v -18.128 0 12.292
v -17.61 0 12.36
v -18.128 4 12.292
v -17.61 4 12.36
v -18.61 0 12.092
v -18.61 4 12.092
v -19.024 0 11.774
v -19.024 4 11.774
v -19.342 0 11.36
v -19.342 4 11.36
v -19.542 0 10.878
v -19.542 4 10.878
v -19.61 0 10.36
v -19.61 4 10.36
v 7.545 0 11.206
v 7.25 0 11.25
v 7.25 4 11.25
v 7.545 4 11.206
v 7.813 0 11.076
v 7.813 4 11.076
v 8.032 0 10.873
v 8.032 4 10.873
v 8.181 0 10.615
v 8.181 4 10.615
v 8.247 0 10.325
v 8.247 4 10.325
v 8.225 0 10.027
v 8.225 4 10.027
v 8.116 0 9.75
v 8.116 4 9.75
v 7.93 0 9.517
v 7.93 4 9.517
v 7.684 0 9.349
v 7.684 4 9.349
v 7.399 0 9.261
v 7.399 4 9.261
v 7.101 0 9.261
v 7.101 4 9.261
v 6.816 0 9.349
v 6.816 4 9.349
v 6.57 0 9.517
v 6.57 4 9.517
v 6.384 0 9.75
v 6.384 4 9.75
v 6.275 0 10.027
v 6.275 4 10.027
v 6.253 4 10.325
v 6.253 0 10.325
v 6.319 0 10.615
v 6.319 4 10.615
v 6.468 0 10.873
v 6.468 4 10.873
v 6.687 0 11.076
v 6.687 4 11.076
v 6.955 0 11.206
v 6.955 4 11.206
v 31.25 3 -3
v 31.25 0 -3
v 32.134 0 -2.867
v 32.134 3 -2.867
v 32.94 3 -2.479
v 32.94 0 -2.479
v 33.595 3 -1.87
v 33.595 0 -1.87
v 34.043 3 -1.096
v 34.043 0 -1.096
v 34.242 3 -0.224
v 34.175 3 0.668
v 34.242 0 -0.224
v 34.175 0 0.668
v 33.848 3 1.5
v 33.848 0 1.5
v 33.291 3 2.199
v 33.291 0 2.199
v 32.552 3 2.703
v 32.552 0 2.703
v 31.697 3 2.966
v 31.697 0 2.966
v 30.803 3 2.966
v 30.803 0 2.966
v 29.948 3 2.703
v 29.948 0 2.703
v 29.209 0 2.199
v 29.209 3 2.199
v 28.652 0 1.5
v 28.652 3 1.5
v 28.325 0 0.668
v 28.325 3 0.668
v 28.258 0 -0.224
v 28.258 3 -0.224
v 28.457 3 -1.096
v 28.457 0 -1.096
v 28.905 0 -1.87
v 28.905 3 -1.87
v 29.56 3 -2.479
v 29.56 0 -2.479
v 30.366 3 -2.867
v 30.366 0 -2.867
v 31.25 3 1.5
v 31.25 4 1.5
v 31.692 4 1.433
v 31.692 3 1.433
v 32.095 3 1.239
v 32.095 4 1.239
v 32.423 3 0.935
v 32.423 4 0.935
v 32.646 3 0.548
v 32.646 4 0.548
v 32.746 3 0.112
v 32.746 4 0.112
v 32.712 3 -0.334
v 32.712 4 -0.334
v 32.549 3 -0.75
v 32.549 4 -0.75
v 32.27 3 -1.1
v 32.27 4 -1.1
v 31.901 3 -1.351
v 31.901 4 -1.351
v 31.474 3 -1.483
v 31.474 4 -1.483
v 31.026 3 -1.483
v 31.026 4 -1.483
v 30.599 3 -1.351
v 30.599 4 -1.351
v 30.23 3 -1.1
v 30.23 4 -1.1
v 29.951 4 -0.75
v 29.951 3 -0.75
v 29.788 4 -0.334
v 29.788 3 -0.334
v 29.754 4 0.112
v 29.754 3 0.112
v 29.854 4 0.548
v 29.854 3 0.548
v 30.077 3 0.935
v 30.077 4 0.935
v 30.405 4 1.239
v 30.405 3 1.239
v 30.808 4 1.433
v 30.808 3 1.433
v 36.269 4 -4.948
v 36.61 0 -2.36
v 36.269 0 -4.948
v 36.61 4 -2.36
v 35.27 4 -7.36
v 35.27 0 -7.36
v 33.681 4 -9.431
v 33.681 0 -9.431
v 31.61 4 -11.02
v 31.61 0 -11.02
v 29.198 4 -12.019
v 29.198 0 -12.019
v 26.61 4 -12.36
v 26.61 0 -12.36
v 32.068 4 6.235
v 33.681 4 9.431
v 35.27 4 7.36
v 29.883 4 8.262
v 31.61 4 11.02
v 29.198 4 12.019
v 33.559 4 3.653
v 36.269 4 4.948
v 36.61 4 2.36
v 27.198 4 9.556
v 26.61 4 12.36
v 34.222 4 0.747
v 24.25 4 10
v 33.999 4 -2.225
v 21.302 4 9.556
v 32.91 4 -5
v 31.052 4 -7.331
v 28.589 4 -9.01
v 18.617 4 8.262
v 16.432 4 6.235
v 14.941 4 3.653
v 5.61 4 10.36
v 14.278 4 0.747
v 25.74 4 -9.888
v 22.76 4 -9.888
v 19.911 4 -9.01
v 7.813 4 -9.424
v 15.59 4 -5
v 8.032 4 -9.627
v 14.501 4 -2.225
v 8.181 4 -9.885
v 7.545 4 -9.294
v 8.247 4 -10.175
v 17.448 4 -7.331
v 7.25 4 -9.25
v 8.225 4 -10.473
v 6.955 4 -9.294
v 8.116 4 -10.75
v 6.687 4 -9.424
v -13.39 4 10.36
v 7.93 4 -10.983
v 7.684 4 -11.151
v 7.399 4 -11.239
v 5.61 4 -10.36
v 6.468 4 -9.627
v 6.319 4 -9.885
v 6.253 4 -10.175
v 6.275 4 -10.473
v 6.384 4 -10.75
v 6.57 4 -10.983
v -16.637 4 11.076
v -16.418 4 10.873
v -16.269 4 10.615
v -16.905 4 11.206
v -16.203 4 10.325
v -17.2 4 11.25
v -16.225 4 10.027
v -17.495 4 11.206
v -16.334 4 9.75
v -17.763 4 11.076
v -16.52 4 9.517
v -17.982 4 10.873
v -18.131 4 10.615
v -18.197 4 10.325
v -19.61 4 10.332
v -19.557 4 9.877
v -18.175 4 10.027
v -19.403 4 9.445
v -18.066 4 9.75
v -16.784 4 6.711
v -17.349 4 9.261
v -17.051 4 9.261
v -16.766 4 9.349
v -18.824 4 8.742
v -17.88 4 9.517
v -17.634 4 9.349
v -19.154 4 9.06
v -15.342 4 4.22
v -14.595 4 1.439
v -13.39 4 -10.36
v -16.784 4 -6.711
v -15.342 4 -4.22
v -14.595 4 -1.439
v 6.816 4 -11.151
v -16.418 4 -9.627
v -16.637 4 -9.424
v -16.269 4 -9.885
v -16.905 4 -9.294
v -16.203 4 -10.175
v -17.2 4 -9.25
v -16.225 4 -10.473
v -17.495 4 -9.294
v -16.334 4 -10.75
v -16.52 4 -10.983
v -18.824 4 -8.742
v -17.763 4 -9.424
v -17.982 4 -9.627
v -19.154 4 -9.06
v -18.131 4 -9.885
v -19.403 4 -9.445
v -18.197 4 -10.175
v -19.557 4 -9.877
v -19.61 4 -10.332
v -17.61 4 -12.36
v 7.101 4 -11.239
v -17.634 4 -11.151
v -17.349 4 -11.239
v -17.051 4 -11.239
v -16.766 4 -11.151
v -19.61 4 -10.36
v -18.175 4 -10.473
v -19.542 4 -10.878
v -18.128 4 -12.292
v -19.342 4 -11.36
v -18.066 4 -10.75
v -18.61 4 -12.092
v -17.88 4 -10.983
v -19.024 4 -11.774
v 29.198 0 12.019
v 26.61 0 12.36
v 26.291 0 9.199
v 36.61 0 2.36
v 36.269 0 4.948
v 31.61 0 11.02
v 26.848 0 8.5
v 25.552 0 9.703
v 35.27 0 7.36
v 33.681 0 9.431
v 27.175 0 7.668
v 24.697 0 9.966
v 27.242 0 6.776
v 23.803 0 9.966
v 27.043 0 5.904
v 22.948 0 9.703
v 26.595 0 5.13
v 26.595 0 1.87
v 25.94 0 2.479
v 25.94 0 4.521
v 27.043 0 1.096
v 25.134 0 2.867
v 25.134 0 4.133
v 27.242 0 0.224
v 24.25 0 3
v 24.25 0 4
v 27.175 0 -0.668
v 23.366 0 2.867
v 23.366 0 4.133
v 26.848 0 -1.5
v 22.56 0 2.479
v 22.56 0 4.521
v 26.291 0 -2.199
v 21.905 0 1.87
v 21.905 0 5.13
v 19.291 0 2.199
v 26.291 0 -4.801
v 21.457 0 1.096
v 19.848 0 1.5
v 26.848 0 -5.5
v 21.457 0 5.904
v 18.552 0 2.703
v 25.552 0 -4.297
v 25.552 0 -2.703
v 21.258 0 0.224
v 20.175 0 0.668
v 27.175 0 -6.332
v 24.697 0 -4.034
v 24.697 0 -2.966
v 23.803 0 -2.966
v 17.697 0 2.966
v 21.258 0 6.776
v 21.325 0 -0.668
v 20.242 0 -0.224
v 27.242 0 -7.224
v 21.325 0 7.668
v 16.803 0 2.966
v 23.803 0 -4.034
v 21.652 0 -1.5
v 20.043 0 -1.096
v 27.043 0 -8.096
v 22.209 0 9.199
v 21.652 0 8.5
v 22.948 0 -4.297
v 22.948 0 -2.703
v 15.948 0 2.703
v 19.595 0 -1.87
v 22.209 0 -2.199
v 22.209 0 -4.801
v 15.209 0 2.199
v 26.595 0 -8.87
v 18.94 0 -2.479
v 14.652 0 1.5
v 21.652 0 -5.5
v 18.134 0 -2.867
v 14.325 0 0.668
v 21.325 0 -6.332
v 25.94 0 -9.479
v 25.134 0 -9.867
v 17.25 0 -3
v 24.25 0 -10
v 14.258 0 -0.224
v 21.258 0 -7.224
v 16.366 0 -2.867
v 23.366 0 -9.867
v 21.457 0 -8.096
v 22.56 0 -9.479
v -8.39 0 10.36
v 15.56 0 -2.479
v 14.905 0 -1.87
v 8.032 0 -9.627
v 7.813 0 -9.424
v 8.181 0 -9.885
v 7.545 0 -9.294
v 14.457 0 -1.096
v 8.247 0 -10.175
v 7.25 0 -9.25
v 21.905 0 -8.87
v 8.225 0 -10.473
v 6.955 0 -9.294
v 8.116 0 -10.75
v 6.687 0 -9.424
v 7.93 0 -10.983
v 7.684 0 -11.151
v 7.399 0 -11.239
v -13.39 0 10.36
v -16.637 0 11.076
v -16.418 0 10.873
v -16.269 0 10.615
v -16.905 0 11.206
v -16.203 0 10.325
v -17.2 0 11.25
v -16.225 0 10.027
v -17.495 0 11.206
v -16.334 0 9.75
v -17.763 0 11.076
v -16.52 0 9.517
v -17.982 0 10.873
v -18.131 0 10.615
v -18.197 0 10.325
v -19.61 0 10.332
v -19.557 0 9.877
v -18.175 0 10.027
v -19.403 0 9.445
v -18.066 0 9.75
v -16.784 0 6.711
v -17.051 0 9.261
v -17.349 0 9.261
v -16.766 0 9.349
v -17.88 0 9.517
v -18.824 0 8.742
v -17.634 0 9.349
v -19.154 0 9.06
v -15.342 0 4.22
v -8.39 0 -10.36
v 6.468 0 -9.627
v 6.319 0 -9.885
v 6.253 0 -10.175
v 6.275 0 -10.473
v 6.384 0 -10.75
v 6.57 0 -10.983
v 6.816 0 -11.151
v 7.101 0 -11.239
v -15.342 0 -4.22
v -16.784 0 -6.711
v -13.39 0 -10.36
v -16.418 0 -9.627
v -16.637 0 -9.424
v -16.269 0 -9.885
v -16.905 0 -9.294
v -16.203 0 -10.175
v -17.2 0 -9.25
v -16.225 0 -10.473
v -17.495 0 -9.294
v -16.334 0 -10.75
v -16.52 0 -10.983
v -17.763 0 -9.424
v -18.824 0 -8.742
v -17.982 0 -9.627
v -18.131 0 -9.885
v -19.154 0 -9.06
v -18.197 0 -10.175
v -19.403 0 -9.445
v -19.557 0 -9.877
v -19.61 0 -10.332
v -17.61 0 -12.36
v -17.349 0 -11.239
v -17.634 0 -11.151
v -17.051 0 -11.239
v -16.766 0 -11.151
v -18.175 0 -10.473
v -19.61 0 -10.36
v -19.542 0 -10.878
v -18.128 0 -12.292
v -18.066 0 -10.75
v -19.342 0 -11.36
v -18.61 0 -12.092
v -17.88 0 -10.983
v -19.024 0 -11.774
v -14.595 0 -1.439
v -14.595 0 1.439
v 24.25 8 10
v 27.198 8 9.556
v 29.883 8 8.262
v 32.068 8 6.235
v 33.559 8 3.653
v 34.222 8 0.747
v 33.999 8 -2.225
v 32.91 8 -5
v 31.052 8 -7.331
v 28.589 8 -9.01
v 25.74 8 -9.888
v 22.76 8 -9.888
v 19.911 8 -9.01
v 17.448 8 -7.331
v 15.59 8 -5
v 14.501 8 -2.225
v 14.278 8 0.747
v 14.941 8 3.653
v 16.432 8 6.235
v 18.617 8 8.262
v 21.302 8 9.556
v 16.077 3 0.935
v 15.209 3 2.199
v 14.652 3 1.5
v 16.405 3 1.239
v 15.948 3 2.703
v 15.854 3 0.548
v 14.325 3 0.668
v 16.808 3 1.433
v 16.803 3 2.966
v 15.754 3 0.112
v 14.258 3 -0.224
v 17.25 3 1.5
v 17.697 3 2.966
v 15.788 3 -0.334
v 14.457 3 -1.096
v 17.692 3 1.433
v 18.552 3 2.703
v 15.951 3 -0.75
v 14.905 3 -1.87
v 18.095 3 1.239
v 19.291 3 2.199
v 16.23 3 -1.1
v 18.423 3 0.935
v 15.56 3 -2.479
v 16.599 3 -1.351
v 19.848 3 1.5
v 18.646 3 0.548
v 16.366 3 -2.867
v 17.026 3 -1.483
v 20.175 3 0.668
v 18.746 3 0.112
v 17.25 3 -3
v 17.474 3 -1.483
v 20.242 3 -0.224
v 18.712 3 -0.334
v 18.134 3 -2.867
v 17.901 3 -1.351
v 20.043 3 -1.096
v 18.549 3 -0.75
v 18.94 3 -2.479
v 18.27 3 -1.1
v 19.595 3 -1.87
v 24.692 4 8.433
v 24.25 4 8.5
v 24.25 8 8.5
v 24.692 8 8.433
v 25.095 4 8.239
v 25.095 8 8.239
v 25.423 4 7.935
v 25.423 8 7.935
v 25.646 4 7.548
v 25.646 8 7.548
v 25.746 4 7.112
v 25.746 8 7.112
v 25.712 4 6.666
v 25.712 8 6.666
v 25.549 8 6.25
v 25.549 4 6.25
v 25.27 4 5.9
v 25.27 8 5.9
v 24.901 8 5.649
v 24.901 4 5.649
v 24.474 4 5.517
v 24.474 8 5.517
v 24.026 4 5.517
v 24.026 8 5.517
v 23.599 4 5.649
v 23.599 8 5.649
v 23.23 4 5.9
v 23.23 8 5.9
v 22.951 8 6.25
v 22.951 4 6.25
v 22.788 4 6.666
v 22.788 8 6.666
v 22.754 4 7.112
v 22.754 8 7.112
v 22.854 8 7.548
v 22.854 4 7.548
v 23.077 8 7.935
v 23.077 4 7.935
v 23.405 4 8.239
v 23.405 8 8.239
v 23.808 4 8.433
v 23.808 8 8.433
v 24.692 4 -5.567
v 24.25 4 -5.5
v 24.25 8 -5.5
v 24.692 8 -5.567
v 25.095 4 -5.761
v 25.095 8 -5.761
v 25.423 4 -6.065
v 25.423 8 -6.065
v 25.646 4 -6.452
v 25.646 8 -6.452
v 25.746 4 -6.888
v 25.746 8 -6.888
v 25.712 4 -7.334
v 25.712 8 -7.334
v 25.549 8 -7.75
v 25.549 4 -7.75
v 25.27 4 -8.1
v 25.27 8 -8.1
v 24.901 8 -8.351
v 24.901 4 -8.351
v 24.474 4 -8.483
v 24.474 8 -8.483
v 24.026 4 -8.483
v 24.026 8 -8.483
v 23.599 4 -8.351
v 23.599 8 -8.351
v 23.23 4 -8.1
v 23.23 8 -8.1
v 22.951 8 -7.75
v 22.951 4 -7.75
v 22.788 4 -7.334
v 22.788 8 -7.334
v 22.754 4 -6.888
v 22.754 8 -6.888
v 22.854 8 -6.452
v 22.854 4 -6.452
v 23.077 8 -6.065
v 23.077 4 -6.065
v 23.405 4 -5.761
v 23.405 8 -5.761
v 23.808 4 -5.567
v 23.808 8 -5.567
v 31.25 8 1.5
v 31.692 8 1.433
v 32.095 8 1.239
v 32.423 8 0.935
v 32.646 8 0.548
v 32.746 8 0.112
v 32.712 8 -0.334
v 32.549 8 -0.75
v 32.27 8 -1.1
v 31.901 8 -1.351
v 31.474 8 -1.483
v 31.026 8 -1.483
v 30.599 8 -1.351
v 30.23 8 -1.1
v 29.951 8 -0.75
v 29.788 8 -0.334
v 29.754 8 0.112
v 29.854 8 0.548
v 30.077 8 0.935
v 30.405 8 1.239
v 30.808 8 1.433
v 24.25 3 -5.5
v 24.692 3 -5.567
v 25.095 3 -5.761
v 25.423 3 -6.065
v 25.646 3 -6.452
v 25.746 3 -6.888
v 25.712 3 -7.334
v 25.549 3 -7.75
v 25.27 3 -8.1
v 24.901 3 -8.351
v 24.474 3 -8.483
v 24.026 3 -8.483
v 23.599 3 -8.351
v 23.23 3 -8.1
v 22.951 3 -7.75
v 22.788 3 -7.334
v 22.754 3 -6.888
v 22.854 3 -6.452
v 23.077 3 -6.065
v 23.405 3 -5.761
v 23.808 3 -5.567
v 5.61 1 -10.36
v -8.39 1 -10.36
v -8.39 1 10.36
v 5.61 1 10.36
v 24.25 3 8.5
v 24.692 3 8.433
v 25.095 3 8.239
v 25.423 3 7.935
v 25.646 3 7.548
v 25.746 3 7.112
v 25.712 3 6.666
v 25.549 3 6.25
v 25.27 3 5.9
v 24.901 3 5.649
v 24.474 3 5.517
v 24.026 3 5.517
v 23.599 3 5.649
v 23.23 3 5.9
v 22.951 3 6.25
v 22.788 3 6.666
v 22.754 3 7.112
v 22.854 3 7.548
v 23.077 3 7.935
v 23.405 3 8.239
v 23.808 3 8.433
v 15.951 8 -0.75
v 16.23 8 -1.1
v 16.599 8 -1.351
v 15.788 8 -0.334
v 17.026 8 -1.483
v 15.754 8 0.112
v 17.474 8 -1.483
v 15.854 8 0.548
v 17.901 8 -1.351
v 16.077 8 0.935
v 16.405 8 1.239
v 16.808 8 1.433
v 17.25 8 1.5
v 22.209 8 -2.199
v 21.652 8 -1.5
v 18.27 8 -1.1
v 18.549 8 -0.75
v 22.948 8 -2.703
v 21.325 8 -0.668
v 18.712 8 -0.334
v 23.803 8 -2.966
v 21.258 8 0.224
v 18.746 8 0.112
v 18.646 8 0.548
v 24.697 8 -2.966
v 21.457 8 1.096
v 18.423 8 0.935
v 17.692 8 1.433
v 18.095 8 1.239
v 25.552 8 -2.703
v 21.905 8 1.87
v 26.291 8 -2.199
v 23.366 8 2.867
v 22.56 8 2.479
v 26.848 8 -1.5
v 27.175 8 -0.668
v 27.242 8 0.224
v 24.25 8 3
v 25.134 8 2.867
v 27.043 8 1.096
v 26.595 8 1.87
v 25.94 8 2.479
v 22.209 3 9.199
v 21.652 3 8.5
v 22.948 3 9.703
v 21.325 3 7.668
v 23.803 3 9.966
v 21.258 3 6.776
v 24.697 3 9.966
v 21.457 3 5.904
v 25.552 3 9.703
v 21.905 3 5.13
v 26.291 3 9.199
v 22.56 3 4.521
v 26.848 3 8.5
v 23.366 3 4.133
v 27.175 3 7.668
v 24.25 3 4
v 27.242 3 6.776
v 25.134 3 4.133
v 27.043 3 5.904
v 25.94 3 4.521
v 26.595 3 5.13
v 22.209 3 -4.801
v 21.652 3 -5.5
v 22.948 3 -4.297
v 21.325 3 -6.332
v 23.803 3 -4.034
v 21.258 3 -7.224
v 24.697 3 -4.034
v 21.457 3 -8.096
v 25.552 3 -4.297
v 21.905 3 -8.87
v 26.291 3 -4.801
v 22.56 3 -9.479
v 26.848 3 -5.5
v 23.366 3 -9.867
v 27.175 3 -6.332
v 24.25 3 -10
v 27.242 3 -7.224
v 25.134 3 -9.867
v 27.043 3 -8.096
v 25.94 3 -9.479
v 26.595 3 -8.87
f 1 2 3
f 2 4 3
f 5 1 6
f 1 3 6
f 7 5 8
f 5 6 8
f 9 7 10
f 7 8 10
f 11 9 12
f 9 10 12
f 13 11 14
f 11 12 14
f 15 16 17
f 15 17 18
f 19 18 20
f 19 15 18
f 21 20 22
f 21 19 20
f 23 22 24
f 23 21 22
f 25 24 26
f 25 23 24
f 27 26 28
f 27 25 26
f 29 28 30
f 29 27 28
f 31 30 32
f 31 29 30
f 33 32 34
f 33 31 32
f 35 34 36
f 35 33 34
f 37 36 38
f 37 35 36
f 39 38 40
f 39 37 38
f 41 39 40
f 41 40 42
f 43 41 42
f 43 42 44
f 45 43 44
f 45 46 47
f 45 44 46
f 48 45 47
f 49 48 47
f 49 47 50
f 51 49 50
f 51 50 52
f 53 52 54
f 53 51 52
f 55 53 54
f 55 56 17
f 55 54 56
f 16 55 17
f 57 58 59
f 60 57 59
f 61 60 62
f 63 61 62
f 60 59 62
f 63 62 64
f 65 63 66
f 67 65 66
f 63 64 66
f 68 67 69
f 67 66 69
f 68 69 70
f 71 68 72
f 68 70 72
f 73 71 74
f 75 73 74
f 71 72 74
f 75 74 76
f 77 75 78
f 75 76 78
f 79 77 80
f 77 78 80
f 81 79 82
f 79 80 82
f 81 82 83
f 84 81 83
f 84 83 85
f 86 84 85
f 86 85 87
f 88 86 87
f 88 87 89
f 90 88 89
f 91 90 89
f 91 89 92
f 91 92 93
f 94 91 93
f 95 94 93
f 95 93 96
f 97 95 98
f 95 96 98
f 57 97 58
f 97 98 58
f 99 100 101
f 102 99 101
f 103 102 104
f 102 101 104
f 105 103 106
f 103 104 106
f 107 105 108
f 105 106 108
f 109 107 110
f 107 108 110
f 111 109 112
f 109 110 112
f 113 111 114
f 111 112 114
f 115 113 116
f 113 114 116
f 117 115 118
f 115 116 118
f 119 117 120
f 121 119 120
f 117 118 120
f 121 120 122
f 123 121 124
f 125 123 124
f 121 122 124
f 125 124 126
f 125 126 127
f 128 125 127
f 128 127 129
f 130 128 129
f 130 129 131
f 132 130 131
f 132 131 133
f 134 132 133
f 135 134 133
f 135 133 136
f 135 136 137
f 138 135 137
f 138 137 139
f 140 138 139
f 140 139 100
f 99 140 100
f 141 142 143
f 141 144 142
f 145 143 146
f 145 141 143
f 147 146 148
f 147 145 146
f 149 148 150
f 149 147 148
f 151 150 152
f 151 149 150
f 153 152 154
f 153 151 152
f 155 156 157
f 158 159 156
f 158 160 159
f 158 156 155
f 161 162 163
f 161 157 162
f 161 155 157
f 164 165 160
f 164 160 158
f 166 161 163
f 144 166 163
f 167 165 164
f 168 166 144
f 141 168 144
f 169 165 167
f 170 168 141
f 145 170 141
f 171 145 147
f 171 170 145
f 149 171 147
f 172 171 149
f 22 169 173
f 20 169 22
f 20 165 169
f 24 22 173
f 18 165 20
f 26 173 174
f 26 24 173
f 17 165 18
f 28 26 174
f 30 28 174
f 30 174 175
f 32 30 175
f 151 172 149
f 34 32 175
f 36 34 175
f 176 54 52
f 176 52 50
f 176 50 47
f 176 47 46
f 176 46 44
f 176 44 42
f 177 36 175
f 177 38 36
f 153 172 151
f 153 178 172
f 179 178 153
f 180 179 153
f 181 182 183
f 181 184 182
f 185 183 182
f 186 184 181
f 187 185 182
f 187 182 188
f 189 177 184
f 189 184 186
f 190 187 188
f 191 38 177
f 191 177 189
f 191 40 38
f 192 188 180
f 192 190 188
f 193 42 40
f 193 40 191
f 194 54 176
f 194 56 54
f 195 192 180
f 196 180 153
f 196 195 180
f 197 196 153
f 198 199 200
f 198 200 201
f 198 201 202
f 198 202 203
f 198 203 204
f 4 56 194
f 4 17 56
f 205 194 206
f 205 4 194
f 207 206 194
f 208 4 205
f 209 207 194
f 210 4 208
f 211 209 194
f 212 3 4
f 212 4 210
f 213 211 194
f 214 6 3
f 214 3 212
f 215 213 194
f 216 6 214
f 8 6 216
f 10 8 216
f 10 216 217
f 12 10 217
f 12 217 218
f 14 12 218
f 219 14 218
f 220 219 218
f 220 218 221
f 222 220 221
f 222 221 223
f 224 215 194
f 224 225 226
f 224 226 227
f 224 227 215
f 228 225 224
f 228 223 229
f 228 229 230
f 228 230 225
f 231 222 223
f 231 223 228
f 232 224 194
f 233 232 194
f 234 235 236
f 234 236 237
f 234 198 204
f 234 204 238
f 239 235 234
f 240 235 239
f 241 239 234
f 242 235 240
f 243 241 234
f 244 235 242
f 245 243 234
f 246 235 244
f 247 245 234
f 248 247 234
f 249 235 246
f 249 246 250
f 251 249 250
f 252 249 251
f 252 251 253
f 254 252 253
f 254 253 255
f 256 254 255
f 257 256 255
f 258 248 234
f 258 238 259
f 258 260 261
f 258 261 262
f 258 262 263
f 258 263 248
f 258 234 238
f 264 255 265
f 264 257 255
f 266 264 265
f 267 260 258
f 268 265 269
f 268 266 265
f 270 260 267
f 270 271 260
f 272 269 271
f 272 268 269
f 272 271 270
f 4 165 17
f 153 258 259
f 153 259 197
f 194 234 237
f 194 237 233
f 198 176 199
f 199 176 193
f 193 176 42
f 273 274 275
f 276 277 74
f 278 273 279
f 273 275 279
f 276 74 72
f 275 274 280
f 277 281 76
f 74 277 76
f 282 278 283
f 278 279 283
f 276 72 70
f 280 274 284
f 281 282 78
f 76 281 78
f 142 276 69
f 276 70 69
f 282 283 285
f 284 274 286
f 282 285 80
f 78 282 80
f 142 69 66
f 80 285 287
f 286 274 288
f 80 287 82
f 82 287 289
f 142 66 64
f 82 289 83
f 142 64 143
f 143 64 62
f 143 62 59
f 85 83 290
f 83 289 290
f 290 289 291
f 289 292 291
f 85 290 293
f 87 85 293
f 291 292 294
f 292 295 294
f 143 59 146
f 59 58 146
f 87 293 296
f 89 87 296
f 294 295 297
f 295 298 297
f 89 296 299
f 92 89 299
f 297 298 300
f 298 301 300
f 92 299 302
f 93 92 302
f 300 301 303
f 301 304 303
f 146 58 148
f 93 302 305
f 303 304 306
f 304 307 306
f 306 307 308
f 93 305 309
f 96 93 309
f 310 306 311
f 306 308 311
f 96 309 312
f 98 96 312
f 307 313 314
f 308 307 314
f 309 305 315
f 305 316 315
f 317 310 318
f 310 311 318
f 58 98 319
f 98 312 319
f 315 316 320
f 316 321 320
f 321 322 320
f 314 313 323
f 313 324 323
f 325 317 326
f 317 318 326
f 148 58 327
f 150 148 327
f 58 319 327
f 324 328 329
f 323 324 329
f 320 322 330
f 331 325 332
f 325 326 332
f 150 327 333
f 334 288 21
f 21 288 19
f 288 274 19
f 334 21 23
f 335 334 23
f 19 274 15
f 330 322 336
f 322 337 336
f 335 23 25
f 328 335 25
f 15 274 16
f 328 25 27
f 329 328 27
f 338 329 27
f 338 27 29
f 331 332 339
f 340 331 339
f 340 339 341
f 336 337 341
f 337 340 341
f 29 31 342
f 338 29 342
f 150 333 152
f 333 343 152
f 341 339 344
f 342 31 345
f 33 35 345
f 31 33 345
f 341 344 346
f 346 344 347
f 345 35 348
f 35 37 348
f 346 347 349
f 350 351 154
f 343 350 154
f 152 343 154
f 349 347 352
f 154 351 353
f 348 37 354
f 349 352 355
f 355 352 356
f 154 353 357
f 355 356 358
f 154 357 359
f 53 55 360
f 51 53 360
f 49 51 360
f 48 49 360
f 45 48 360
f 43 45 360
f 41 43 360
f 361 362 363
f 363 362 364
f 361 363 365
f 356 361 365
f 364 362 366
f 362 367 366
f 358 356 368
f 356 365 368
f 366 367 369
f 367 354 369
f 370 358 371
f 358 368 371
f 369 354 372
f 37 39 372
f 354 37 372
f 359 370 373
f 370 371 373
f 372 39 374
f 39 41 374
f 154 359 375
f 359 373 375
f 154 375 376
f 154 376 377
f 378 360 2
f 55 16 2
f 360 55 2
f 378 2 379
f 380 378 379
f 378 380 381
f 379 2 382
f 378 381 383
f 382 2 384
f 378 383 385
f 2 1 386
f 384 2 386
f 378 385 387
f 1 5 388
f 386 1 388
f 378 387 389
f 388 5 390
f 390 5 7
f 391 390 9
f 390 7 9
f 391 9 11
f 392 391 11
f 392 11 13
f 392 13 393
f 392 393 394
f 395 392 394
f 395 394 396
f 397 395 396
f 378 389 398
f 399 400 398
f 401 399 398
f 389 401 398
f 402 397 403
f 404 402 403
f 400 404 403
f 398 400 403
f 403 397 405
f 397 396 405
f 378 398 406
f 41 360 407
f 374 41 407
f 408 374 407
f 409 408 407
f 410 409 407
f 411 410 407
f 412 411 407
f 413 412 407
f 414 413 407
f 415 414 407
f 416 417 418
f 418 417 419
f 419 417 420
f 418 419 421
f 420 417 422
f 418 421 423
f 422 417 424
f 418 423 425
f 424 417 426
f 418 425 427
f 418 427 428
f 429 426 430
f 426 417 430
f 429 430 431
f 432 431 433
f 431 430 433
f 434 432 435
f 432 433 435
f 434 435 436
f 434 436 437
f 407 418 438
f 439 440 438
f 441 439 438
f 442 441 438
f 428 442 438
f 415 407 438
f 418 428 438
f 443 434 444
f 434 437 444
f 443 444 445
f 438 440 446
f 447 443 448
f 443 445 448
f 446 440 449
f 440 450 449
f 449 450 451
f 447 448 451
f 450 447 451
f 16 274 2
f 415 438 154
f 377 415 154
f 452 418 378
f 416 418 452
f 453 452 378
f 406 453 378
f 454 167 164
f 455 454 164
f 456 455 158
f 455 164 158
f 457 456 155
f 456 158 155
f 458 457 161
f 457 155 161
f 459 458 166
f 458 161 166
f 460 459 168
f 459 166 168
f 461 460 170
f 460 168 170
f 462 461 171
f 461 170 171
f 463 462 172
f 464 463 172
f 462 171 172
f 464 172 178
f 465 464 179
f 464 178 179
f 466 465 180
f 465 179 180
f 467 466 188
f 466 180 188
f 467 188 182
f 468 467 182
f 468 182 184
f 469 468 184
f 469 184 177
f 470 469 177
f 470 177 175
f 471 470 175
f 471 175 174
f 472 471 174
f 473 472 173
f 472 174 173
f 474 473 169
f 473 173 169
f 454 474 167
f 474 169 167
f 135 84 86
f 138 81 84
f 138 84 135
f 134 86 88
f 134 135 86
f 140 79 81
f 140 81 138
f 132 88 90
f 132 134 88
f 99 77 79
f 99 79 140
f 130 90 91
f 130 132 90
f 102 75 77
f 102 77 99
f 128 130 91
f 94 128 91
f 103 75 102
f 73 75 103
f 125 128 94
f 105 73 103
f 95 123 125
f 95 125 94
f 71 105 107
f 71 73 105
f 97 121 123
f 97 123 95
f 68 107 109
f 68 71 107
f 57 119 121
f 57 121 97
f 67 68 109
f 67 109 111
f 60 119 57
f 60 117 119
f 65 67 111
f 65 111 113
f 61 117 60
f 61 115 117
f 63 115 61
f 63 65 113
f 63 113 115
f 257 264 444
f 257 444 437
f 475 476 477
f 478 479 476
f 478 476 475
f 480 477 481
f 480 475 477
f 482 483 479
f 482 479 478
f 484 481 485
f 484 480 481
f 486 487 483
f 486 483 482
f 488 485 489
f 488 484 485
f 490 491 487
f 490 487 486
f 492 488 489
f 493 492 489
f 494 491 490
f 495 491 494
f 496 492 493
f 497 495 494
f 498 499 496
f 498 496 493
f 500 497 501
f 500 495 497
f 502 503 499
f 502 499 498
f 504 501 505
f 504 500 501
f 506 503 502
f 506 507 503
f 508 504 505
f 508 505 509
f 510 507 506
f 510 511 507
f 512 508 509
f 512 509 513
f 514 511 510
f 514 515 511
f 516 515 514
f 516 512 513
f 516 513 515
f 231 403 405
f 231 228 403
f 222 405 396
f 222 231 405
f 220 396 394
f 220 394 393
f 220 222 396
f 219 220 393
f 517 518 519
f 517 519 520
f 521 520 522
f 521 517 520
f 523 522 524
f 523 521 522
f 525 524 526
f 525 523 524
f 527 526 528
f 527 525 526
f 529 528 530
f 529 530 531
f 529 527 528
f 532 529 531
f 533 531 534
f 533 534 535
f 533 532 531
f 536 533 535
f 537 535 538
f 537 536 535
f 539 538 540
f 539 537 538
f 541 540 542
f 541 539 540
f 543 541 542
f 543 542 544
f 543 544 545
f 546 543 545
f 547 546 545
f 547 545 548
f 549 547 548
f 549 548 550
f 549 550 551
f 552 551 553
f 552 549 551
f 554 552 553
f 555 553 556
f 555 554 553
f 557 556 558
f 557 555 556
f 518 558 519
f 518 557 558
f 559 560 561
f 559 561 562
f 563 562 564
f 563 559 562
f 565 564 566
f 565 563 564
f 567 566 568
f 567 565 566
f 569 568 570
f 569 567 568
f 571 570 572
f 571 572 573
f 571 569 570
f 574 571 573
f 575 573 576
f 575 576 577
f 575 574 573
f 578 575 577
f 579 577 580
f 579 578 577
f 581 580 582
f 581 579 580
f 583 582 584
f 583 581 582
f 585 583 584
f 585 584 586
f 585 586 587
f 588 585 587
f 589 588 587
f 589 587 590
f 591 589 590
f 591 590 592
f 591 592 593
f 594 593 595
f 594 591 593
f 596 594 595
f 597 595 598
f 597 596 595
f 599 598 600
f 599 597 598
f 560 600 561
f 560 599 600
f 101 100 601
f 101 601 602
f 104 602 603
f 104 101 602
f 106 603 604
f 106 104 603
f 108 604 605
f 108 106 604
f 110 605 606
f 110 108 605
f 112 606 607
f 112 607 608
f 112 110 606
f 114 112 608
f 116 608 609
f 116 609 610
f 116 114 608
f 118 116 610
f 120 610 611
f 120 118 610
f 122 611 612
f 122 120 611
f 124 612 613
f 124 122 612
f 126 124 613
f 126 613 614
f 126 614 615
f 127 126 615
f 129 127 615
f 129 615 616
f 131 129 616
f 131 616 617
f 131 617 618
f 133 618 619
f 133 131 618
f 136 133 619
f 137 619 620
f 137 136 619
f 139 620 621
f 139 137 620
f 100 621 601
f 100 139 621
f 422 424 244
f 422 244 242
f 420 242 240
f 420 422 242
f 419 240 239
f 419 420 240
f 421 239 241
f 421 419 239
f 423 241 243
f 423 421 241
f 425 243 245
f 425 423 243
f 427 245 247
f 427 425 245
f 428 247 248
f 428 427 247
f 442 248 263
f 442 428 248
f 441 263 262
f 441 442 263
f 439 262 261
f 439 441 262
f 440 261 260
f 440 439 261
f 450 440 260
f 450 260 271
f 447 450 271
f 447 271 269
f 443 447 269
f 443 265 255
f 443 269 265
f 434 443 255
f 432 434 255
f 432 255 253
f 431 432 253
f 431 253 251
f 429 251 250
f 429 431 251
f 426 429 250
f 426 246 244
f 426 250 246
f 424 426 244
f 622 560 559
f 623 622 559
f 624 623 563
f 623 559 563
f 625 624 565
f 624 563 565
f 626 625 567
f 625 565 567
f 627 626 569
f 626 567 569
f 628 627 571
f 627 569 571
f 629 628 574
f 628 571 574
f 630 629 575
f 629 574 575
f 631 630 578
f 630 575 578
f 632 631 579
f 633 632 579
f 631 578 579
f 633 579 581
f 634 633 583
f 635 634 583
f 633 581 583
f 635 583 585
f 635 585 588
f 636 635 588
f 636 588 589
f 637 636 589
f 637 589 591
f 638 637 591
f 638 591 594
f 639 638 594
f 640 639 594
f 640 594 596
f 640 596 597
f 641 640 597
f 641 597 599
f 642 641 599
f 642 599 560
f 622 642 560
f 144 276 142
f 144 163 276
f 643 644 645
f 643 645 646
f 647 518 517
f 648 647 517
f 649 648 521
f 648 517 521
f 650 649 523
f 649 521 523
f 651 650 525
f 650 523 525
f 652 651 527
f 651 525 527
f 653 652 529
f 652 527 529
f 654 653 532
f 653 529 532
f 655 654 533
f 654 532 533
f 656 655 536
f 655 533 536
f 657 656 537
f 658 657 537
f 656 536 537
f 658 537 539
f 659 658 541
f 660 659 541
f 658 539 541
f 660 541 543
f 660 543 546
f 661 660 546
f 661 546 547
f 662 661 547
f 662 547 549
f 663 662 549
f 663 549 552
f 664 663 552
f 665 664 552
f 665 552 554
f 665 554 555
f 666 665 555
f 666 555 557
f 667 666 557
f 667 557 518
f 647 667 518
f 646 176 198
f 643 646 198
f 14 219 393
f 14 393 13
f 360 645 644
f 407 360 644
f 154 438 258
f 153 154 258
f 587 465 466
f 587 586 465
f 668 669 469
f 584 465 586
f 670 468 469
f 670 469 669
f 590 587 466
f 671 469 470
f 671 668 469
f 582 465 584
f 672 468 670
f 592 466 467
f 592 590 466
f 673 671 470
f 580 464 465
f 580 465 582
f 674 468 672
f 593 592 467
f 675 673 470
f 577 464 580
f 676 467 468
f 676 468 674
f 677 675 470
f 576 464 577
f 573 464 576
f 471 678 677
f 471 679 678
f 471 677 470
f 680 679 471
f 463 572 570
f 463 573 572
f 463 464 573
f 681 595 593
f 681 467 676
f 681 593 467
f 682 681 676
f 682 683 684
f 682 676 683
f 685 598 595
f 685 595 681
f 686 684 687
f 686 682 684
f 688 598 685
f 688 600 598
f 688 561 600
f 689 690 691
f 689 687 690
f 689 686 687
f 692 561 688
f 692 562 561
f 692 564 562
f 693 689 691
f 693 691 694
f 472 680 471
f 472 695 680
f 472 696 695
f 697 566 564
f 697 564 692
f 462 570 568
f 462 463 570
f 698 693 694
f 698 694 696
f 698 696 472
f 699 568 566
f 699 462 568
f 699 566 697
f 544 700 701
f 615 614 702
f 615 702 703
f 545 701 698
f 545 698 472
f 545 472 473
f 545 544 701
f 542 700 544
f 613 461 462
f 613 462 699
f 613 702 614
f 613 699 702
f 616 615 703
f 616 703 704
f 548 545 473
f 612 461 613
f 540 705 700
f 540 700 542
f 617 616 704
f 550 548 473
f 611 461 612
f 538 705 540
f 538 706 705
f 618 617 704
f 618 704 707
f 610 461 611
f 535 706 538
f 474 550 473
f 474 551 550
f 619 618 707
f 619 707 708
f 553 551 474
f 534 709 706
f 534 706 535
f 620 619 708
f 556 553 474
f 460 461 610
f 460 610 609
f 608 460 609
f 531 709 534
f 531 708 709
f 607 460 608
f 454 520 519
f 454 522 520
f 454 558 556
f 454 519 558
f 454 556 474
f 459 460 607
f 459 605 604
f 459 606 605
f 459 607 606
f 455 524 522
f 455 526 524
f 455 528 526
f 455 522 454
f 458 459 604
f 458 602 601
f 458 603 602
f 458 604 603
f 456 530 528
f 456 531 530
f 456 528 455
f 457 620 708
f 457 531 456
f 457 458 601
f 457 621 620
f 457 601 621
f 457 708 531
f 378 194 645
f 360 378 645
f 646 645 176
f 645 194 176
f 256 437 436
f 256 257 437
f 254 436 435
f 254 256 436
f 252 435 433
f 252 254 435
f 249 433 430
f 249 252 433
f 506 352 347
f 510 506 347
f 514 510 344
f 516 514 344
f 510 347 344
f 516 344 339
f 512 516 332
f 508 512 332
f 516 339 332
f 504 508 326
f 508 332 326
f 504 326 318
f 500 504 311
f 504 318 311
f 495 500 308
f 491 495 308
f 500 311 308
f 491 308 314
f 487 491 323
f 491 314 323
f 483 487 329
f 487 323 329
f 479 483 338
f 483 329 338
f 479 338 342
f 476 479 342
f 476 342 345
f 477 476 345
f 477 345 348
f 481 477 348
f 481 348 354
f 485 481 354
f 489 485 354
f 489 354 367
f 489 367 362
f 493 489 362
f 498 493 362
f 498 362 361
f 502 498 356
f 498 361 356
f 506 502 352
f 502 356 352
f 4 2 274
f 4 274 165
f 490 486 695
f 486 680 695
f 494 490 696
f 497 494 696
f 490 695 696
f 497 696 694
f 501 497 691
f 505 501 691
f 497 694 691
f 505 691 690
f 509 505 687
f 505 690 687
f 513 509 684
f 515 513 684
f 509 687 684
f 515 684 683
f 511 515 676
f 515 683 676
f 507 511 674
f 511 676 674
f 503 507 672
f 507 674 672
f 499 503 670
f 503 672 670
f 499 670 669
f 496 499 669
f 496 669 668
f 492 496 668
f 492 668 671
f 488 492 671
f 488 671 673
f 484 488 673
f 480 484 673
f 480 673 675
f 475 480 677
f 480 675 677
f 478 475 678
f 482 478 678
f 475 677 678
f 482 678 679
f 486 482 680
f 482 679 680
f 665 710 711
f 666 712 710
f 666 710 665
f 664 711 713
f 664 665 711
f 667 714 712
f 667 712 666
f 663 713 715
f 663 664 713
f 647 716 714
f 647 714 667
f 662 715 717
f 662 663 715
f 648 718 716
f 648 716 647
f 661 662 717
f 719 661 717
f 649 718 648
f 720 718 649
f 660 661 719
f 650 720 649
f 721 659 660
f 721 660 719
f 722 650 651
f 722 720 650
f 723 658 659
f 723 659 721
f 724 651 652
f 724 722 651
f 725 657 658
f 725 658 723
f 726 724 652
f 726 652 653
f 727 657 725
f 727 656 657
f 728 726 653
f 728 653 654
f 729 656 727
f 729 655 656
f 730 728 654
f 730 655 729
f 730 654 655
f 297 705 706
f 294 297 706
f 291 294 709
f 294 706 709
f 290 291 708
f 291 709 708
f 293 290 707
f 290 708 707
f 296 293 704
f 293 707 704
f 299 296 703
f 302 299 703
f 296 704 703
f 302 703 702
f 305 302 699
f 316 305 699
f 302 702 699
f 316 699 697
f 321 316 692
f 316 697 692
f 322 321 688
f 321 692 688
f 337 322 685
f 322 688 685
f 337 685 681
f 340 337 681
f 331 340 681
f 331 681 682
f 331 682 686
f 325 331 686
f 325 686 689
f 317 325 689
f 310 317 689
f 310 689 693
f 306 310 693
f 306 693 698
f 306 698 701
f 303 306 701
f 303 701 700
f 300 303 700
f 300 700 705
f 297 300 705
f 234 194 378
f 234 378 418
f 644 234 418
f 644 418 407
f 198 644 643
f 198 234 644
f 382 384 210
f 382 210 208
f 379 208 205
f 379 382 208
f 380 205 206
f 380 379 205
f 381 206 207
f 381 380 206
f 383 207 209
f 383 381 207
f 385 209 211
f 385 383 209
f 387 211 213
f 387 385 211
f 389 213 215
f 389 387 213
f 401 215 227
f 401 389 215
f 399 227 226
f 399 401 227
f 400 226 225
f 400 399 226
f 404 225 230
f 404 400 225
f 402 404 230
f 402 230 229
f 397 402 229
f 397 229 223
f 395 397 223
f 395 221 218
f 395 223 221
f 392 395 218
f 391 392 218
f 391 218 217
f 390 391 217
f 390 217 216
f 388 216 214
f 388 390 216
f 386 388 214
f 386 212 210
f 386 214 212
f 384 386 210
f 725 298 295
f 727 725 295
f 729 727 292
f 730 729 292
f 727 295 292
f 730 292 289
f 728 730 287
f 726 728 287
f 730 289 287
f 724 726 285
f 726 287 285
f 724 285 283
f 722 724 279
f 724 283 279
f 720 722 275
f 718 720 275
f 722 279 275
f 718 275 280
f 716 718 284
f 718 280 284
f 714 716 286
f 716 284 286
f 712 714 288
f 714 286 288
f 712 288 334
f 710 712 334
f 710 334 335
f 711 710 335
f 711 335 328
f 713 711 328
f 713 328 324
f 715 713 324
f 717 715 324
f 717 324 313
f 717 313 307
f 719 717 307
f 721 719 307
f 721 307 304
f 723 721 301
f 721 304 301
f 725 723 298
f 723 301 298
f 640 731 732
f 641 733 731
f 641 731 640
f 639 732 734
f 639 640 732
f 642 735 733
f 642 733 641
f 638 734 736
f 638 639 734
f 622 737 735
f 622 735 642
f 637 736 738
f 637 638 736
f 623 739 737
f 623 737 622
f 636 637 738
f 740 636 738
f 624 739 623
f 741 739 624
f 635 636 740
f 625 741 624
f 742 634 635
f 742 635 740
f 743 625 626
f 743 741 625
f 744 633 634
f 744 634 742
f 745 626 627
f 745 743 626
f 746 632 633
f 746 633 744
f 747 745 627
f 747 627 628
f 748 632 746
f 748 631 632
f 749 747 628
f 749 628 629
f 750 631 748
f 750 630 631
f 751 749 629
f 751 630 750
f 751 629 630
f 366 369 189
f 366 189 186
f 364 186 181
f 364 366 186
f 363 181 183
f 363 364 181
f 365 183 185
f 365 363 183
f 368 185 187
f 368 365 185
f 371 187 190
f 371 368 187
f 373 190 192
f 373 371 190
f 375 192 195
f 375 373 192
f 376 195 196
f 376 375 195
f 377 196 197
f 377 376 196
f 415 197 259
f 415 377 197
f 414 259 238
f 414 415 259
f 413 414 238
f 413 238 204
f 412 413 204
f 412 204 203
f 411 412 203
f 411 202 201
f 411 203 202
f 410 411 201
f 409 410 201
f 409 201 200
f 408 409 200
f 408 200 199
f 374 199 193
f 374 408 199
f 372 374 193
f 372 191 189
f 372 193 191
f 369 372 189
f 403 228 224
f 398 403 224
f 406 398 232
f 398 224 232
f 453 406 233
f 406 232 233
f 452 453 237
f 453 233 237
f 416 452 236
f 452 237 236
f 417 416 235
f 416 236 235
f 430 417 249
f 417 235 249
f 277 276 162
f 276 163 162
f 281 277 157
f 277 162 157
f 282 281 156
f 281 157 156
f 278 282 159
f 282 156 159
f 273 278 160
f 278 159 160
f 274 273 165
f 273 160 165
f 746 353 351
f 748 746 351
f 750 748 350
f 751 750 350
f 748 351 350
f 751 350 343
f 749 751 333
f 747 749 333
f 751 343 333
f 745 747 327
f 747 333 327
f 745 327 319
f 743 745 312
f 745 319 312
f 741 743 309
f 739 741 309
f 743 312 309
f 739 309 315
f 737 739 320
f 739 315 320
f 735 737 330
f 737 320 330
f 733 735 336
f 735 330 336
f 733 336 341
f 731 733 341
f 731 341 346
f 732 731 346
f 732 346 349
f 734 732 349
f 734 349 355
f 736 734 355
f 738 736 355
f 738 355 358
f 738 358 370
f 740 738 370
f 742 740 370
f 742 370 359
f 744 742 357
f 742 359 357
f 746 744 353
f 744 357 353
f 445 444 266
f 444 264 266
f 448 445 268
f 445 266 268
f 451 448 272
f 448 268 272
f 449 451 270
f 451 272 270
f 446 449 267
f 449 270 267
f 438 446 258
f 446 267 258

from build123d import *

# Parameters (mm, degrees)
EXTRUDE_1_DEPTH          = 4
CUT_EXTRUDE_1_DEPTH      = 38.905694823
CUT_EXTRUDE_1_DEPTH_BACK = 38.905694823
SKETCH_2_R               = 1
SKETCH_3_W               = 14
SKETCH_3_H               = 20.72
CUT_EXTRUDE_3_DEPTH      = 3
SKETCH_5_W               = 5
SKETCH_5_H               = 20.72
CUT_EXTRUDE_4_DEPTH      = 4
SKETCH_13_W              = 24.72
SKETCH_13_H              = 4
EXTRUDE_5_DEPTH          = 27
SKETCH_15_R              = 10
EXTRUDE_6_DEPTH          = 4
SKETCH_14_R              = 1.5
CUT_EXTRUDE_7_DEPTH      = 4
FILLET_1_R               = 10
FILLET_2_R               = 10
SKETCH_6_R               = 11
CUT_EXTRUDE_9_DEPTH      = 4
SKETCH_17_W              = 24.72
SKETCH_17_H              = 4
CUT_EXTRUDE_10_DEPTH     = 16
FILLET_3_R               = 2
FILLET_4_R               = 2
FILLET_5_R               = 2
FILLET_6_R               = 2
SKETCH_18_R              = 3
CUT_EXTRUDE_11_DEPTH     = 13
SKETCH_20_R              = 3
CUT_EXTRUDE_12_DEPTH     = 3


with BuildPart() as part:
    # 草图1 → 凸台-拉伸1 (new body)
    with BuildSketch(Plane(origin=(0, 0, 0), x_dir=(1, 0, 0), z_dir=(0, 1, 0))):
        with BuildLine():
            Line((6.61, -12.36), (9.61, -12.36))
            Line((9.61, -12.36), (9.61, -9.36))
            Line((9.61, -9.36), (9.61, 9.36))
            Line((9.61, 9.36), (9.61, 12.36))
            Line((9.61, 12.36), (6.61, 12.36))
            Line((6.61, 12.36), (-32.61, 12.36))
            ThreePointArc((-32.61, 12.36), (-34.731320344, 11.481320344), (-35.61, 9.36))
            Line((-35.61, 9.36), (-35.61, -9.36))
            ThreePointArc((-35.61, -9.36), (-34.731320344, -11.481320344), (-32.61, -12.36))
            Line((-32.61, -12.36), (6.61, -12.36))
        make_face()
    extrude(amount=EXTRUDE_1_DEPTH)

    # 草图2 → 切除-拉伸1 (cut, two sides: drawn at the far end of the back side and taken through both)
    with BuildSketch(Plane(origin=(0, 0, 0), x_dir=(1, 0, 0), z_dir=(0, 1, 0)).offset(-CUT_EXTRUDE_1_DEPTH_BACK)):
        with Locations(Location((7.25, -10.25, 0), (0, 0, 270))):
            Circle(SKETCH_2_R)
        with Locations(Location((7.25, 10.25, 0), (0, 0, 270))):
            Circle(SKETCH_2_R)
        with Locations(Location((-17.2, -10.25, 0), (0, 0, 270))):
            Circle(SKETCH_2_R)
        with Locations(Location((-17.2, 10.25, 0), (0, 0, 270))):
            Circle(SKETCH_2_R)
    extrude(amount=CUT_EXTRUDE_1_DEPTH + CUT_EXTRUDE_1_DEPTH_BACK, mode=Mode.SUBTRACT)

    # 草图3 → 切除-拉伸3 (cut)
    with BuildSketch(Plane(origin=(0, 4, 0), x_dir=(1, 0, 0), z_dir=(0, 1, 0))):
        with Locations((-1.39, 0)):
            Rectangle(SKETCH_3_W, SKETCH_3_H)
    extrude(amount=-CUT_EXTRUDE_3_DEPTH, mode=Mode.SUBTRACT)

    # 草图5 → 切除-拉伸4 (cut)
    with BuildSketch(Plane(origin=(0, 4, 0), x_dir=(1, 0, 0), z_dir=(0, 1, 0))):
        with Locations((-10.89, 0)):
            Rectangle(SKETCH_5_W, SKETCH_5_H)
    extrude(amount=-CUT_EXTRUDE_4_DEPTH, mode=Mode.SUBTRACT)

    # 草图13 → 凸台-拉伸5 (add)
    with BuildSketch(Plane(origin=(9.61, 0, 0), x_dir=(0, 0, -1), z_dir=(1, 0, 0))):
        with Locations((0, 2)):
            Rectangle(SKETCH_13_W, SKETCH_13_H)
    extrude(amount=EXTRUDE_5_DEPTH)

    # 草图15 → 凸台-拉伸6 (add)
    with BuildSketch(Plane(origin=(0, 4, 0), x_dir=(1, 0, 0), z_dir=(0, 1, 0))):
        with Locations(Location((24.25, 0, 0), (0, 0, 270))):
            Circle(SKETCH_15_R)
    extrude(amount=EXTRUDE_6_DEPTH)

    # 草图14 → 切除-拉伸7 (cut, symmetric)
    with BuildSketch(Plane(origin=(0, 4, 0), x_dir=(1, 0, 0), z_dir=(0, 1, 0))):
        with Locations(Location((24.25, -7, 0), (0, 0, 270))):
            Circle(SKETCH_14_R)
        with Locations(Location((31.25, 0, 0), (0, 0, 270))):
            Circle(SKETCH_14_R)
        with Locations(Location((24.25, 7, 0), (0, 0, 270))):
            Circle(SKETCH_14_R)
        with Locations(Location((17.25, 0, 0), (0, 0, 270))):
            Circle(SKETCH_14_R)
    extrude(amount=CUT_EXTRUDE_7_DEPTH, both=True, mode=Mode.SUBTRACT)

    # 圆角1
    fillet_1_edges = [part.edges().sort_by_distance(p)[0] for p in [
        (36.61, 2, -12.36),
    ]]
    fillet(fillet_1_edges, radius=FILLET_1_R)

    # 圆角2
    fillet_2_edges = [part.edges().sort_by_distance(p)[0] for p in [
        (36.61, 2, 12.36),
    ]]
    fillet(fillet_2_edges, radius=FILLET_2_R)

    # 草图6 → 切除-拉伸9 (cut)
    with BuildSketch(Plane(origin=(0, 4, 0), x_dir=(1, 0, 0), z_dir=(0, 1, 0))):
        with Locations((-25.5, 0)):
            Circle(SKETCH_6_R)
    extrude(amount=-CUT_EXTRUDE_9_DEPTH, mode=Mode.SUBTRACT)

    # 草图17 → 切除-拉伸10 (cut)
    with BuildSketch(Plane.ZY.offset(35.61)):
        with Locations((0, 2)):
            Rectangle(SKETCH_17_W, SKETCH_17_H)
    extrude(amount=-CUT_EXTRUDE_10_DEPTH, mode=Mode.SUBTRACT)

    # 圆角3
    fillet_3_edges = [part.edges().sort_by_distance(p)[0] for p in [
        (-19.61, 2, 12.36),
    ]]
    fillet(fillet_3_edges, radius=FILLET_3_R)

    # 圆角4
    fillet_4_edges = [part.edges().sort_by_distance(p)[0] for p in [
        (-19.61, 2, -12.36),
    ]]
    fillet(fillet_4_edges, radius=FILLET_4_R)

    # 圆角5
    fillet_5_edges = [part.edges().sort_by_distance(p)[0] for p in [
        (-19.61, 2, -9.290204519),
    ]]
    fillet(fillet_5_edges, radius=FILLET_5_R)

    # 圆角6
    fillet_6_edges = [part.edges().sort_by_distance(p)[0] for p in [
        (-19.61, 2, 9.290204519),
    ]]
    fillet(fillet_6_edges, radius=FILLET_6_R)

    # 草图18 → 切除-拉伸11 (cut)
    with BuildSketch(Plane(origin=(0, 8, 0), x_dir=(1, 0, 0), z_dir=(0, 1, 0))):
        with Locations(Location((24.25, 0, 0), (0, 0, 270))):
            Circle(SKETCH_18_R)
    extrude(amount=-CUT_EXTRUDE_11_DEPTH, mode=Mode.SUBTRACT)

    # 草图20 → 切除-拉伸12 (cut)
    with BuildSketch(Plane.XZ):
        with Locations(Location((24.25, 7, 0), (0, 0, 270))):
            Circle(SKETCH_20_R)
        with Locations(Location((17.25, 0, 0), (0, 0, 270))):
            Circle(SKETCH_20_R)
        with Locations(Location((24.25, -7, 0), (0, 0, 270))):
            Circle(SKETCH_20_R)
        with Locations(Location((31.25, 0, 0), (0, 0, 270))):
            Circle(SKETCH_20_R)
    extrude(amount=-CUT_EXTRUDE_12_DEPTH, mode=Mode.SUBTRACT)


solid = part.part
